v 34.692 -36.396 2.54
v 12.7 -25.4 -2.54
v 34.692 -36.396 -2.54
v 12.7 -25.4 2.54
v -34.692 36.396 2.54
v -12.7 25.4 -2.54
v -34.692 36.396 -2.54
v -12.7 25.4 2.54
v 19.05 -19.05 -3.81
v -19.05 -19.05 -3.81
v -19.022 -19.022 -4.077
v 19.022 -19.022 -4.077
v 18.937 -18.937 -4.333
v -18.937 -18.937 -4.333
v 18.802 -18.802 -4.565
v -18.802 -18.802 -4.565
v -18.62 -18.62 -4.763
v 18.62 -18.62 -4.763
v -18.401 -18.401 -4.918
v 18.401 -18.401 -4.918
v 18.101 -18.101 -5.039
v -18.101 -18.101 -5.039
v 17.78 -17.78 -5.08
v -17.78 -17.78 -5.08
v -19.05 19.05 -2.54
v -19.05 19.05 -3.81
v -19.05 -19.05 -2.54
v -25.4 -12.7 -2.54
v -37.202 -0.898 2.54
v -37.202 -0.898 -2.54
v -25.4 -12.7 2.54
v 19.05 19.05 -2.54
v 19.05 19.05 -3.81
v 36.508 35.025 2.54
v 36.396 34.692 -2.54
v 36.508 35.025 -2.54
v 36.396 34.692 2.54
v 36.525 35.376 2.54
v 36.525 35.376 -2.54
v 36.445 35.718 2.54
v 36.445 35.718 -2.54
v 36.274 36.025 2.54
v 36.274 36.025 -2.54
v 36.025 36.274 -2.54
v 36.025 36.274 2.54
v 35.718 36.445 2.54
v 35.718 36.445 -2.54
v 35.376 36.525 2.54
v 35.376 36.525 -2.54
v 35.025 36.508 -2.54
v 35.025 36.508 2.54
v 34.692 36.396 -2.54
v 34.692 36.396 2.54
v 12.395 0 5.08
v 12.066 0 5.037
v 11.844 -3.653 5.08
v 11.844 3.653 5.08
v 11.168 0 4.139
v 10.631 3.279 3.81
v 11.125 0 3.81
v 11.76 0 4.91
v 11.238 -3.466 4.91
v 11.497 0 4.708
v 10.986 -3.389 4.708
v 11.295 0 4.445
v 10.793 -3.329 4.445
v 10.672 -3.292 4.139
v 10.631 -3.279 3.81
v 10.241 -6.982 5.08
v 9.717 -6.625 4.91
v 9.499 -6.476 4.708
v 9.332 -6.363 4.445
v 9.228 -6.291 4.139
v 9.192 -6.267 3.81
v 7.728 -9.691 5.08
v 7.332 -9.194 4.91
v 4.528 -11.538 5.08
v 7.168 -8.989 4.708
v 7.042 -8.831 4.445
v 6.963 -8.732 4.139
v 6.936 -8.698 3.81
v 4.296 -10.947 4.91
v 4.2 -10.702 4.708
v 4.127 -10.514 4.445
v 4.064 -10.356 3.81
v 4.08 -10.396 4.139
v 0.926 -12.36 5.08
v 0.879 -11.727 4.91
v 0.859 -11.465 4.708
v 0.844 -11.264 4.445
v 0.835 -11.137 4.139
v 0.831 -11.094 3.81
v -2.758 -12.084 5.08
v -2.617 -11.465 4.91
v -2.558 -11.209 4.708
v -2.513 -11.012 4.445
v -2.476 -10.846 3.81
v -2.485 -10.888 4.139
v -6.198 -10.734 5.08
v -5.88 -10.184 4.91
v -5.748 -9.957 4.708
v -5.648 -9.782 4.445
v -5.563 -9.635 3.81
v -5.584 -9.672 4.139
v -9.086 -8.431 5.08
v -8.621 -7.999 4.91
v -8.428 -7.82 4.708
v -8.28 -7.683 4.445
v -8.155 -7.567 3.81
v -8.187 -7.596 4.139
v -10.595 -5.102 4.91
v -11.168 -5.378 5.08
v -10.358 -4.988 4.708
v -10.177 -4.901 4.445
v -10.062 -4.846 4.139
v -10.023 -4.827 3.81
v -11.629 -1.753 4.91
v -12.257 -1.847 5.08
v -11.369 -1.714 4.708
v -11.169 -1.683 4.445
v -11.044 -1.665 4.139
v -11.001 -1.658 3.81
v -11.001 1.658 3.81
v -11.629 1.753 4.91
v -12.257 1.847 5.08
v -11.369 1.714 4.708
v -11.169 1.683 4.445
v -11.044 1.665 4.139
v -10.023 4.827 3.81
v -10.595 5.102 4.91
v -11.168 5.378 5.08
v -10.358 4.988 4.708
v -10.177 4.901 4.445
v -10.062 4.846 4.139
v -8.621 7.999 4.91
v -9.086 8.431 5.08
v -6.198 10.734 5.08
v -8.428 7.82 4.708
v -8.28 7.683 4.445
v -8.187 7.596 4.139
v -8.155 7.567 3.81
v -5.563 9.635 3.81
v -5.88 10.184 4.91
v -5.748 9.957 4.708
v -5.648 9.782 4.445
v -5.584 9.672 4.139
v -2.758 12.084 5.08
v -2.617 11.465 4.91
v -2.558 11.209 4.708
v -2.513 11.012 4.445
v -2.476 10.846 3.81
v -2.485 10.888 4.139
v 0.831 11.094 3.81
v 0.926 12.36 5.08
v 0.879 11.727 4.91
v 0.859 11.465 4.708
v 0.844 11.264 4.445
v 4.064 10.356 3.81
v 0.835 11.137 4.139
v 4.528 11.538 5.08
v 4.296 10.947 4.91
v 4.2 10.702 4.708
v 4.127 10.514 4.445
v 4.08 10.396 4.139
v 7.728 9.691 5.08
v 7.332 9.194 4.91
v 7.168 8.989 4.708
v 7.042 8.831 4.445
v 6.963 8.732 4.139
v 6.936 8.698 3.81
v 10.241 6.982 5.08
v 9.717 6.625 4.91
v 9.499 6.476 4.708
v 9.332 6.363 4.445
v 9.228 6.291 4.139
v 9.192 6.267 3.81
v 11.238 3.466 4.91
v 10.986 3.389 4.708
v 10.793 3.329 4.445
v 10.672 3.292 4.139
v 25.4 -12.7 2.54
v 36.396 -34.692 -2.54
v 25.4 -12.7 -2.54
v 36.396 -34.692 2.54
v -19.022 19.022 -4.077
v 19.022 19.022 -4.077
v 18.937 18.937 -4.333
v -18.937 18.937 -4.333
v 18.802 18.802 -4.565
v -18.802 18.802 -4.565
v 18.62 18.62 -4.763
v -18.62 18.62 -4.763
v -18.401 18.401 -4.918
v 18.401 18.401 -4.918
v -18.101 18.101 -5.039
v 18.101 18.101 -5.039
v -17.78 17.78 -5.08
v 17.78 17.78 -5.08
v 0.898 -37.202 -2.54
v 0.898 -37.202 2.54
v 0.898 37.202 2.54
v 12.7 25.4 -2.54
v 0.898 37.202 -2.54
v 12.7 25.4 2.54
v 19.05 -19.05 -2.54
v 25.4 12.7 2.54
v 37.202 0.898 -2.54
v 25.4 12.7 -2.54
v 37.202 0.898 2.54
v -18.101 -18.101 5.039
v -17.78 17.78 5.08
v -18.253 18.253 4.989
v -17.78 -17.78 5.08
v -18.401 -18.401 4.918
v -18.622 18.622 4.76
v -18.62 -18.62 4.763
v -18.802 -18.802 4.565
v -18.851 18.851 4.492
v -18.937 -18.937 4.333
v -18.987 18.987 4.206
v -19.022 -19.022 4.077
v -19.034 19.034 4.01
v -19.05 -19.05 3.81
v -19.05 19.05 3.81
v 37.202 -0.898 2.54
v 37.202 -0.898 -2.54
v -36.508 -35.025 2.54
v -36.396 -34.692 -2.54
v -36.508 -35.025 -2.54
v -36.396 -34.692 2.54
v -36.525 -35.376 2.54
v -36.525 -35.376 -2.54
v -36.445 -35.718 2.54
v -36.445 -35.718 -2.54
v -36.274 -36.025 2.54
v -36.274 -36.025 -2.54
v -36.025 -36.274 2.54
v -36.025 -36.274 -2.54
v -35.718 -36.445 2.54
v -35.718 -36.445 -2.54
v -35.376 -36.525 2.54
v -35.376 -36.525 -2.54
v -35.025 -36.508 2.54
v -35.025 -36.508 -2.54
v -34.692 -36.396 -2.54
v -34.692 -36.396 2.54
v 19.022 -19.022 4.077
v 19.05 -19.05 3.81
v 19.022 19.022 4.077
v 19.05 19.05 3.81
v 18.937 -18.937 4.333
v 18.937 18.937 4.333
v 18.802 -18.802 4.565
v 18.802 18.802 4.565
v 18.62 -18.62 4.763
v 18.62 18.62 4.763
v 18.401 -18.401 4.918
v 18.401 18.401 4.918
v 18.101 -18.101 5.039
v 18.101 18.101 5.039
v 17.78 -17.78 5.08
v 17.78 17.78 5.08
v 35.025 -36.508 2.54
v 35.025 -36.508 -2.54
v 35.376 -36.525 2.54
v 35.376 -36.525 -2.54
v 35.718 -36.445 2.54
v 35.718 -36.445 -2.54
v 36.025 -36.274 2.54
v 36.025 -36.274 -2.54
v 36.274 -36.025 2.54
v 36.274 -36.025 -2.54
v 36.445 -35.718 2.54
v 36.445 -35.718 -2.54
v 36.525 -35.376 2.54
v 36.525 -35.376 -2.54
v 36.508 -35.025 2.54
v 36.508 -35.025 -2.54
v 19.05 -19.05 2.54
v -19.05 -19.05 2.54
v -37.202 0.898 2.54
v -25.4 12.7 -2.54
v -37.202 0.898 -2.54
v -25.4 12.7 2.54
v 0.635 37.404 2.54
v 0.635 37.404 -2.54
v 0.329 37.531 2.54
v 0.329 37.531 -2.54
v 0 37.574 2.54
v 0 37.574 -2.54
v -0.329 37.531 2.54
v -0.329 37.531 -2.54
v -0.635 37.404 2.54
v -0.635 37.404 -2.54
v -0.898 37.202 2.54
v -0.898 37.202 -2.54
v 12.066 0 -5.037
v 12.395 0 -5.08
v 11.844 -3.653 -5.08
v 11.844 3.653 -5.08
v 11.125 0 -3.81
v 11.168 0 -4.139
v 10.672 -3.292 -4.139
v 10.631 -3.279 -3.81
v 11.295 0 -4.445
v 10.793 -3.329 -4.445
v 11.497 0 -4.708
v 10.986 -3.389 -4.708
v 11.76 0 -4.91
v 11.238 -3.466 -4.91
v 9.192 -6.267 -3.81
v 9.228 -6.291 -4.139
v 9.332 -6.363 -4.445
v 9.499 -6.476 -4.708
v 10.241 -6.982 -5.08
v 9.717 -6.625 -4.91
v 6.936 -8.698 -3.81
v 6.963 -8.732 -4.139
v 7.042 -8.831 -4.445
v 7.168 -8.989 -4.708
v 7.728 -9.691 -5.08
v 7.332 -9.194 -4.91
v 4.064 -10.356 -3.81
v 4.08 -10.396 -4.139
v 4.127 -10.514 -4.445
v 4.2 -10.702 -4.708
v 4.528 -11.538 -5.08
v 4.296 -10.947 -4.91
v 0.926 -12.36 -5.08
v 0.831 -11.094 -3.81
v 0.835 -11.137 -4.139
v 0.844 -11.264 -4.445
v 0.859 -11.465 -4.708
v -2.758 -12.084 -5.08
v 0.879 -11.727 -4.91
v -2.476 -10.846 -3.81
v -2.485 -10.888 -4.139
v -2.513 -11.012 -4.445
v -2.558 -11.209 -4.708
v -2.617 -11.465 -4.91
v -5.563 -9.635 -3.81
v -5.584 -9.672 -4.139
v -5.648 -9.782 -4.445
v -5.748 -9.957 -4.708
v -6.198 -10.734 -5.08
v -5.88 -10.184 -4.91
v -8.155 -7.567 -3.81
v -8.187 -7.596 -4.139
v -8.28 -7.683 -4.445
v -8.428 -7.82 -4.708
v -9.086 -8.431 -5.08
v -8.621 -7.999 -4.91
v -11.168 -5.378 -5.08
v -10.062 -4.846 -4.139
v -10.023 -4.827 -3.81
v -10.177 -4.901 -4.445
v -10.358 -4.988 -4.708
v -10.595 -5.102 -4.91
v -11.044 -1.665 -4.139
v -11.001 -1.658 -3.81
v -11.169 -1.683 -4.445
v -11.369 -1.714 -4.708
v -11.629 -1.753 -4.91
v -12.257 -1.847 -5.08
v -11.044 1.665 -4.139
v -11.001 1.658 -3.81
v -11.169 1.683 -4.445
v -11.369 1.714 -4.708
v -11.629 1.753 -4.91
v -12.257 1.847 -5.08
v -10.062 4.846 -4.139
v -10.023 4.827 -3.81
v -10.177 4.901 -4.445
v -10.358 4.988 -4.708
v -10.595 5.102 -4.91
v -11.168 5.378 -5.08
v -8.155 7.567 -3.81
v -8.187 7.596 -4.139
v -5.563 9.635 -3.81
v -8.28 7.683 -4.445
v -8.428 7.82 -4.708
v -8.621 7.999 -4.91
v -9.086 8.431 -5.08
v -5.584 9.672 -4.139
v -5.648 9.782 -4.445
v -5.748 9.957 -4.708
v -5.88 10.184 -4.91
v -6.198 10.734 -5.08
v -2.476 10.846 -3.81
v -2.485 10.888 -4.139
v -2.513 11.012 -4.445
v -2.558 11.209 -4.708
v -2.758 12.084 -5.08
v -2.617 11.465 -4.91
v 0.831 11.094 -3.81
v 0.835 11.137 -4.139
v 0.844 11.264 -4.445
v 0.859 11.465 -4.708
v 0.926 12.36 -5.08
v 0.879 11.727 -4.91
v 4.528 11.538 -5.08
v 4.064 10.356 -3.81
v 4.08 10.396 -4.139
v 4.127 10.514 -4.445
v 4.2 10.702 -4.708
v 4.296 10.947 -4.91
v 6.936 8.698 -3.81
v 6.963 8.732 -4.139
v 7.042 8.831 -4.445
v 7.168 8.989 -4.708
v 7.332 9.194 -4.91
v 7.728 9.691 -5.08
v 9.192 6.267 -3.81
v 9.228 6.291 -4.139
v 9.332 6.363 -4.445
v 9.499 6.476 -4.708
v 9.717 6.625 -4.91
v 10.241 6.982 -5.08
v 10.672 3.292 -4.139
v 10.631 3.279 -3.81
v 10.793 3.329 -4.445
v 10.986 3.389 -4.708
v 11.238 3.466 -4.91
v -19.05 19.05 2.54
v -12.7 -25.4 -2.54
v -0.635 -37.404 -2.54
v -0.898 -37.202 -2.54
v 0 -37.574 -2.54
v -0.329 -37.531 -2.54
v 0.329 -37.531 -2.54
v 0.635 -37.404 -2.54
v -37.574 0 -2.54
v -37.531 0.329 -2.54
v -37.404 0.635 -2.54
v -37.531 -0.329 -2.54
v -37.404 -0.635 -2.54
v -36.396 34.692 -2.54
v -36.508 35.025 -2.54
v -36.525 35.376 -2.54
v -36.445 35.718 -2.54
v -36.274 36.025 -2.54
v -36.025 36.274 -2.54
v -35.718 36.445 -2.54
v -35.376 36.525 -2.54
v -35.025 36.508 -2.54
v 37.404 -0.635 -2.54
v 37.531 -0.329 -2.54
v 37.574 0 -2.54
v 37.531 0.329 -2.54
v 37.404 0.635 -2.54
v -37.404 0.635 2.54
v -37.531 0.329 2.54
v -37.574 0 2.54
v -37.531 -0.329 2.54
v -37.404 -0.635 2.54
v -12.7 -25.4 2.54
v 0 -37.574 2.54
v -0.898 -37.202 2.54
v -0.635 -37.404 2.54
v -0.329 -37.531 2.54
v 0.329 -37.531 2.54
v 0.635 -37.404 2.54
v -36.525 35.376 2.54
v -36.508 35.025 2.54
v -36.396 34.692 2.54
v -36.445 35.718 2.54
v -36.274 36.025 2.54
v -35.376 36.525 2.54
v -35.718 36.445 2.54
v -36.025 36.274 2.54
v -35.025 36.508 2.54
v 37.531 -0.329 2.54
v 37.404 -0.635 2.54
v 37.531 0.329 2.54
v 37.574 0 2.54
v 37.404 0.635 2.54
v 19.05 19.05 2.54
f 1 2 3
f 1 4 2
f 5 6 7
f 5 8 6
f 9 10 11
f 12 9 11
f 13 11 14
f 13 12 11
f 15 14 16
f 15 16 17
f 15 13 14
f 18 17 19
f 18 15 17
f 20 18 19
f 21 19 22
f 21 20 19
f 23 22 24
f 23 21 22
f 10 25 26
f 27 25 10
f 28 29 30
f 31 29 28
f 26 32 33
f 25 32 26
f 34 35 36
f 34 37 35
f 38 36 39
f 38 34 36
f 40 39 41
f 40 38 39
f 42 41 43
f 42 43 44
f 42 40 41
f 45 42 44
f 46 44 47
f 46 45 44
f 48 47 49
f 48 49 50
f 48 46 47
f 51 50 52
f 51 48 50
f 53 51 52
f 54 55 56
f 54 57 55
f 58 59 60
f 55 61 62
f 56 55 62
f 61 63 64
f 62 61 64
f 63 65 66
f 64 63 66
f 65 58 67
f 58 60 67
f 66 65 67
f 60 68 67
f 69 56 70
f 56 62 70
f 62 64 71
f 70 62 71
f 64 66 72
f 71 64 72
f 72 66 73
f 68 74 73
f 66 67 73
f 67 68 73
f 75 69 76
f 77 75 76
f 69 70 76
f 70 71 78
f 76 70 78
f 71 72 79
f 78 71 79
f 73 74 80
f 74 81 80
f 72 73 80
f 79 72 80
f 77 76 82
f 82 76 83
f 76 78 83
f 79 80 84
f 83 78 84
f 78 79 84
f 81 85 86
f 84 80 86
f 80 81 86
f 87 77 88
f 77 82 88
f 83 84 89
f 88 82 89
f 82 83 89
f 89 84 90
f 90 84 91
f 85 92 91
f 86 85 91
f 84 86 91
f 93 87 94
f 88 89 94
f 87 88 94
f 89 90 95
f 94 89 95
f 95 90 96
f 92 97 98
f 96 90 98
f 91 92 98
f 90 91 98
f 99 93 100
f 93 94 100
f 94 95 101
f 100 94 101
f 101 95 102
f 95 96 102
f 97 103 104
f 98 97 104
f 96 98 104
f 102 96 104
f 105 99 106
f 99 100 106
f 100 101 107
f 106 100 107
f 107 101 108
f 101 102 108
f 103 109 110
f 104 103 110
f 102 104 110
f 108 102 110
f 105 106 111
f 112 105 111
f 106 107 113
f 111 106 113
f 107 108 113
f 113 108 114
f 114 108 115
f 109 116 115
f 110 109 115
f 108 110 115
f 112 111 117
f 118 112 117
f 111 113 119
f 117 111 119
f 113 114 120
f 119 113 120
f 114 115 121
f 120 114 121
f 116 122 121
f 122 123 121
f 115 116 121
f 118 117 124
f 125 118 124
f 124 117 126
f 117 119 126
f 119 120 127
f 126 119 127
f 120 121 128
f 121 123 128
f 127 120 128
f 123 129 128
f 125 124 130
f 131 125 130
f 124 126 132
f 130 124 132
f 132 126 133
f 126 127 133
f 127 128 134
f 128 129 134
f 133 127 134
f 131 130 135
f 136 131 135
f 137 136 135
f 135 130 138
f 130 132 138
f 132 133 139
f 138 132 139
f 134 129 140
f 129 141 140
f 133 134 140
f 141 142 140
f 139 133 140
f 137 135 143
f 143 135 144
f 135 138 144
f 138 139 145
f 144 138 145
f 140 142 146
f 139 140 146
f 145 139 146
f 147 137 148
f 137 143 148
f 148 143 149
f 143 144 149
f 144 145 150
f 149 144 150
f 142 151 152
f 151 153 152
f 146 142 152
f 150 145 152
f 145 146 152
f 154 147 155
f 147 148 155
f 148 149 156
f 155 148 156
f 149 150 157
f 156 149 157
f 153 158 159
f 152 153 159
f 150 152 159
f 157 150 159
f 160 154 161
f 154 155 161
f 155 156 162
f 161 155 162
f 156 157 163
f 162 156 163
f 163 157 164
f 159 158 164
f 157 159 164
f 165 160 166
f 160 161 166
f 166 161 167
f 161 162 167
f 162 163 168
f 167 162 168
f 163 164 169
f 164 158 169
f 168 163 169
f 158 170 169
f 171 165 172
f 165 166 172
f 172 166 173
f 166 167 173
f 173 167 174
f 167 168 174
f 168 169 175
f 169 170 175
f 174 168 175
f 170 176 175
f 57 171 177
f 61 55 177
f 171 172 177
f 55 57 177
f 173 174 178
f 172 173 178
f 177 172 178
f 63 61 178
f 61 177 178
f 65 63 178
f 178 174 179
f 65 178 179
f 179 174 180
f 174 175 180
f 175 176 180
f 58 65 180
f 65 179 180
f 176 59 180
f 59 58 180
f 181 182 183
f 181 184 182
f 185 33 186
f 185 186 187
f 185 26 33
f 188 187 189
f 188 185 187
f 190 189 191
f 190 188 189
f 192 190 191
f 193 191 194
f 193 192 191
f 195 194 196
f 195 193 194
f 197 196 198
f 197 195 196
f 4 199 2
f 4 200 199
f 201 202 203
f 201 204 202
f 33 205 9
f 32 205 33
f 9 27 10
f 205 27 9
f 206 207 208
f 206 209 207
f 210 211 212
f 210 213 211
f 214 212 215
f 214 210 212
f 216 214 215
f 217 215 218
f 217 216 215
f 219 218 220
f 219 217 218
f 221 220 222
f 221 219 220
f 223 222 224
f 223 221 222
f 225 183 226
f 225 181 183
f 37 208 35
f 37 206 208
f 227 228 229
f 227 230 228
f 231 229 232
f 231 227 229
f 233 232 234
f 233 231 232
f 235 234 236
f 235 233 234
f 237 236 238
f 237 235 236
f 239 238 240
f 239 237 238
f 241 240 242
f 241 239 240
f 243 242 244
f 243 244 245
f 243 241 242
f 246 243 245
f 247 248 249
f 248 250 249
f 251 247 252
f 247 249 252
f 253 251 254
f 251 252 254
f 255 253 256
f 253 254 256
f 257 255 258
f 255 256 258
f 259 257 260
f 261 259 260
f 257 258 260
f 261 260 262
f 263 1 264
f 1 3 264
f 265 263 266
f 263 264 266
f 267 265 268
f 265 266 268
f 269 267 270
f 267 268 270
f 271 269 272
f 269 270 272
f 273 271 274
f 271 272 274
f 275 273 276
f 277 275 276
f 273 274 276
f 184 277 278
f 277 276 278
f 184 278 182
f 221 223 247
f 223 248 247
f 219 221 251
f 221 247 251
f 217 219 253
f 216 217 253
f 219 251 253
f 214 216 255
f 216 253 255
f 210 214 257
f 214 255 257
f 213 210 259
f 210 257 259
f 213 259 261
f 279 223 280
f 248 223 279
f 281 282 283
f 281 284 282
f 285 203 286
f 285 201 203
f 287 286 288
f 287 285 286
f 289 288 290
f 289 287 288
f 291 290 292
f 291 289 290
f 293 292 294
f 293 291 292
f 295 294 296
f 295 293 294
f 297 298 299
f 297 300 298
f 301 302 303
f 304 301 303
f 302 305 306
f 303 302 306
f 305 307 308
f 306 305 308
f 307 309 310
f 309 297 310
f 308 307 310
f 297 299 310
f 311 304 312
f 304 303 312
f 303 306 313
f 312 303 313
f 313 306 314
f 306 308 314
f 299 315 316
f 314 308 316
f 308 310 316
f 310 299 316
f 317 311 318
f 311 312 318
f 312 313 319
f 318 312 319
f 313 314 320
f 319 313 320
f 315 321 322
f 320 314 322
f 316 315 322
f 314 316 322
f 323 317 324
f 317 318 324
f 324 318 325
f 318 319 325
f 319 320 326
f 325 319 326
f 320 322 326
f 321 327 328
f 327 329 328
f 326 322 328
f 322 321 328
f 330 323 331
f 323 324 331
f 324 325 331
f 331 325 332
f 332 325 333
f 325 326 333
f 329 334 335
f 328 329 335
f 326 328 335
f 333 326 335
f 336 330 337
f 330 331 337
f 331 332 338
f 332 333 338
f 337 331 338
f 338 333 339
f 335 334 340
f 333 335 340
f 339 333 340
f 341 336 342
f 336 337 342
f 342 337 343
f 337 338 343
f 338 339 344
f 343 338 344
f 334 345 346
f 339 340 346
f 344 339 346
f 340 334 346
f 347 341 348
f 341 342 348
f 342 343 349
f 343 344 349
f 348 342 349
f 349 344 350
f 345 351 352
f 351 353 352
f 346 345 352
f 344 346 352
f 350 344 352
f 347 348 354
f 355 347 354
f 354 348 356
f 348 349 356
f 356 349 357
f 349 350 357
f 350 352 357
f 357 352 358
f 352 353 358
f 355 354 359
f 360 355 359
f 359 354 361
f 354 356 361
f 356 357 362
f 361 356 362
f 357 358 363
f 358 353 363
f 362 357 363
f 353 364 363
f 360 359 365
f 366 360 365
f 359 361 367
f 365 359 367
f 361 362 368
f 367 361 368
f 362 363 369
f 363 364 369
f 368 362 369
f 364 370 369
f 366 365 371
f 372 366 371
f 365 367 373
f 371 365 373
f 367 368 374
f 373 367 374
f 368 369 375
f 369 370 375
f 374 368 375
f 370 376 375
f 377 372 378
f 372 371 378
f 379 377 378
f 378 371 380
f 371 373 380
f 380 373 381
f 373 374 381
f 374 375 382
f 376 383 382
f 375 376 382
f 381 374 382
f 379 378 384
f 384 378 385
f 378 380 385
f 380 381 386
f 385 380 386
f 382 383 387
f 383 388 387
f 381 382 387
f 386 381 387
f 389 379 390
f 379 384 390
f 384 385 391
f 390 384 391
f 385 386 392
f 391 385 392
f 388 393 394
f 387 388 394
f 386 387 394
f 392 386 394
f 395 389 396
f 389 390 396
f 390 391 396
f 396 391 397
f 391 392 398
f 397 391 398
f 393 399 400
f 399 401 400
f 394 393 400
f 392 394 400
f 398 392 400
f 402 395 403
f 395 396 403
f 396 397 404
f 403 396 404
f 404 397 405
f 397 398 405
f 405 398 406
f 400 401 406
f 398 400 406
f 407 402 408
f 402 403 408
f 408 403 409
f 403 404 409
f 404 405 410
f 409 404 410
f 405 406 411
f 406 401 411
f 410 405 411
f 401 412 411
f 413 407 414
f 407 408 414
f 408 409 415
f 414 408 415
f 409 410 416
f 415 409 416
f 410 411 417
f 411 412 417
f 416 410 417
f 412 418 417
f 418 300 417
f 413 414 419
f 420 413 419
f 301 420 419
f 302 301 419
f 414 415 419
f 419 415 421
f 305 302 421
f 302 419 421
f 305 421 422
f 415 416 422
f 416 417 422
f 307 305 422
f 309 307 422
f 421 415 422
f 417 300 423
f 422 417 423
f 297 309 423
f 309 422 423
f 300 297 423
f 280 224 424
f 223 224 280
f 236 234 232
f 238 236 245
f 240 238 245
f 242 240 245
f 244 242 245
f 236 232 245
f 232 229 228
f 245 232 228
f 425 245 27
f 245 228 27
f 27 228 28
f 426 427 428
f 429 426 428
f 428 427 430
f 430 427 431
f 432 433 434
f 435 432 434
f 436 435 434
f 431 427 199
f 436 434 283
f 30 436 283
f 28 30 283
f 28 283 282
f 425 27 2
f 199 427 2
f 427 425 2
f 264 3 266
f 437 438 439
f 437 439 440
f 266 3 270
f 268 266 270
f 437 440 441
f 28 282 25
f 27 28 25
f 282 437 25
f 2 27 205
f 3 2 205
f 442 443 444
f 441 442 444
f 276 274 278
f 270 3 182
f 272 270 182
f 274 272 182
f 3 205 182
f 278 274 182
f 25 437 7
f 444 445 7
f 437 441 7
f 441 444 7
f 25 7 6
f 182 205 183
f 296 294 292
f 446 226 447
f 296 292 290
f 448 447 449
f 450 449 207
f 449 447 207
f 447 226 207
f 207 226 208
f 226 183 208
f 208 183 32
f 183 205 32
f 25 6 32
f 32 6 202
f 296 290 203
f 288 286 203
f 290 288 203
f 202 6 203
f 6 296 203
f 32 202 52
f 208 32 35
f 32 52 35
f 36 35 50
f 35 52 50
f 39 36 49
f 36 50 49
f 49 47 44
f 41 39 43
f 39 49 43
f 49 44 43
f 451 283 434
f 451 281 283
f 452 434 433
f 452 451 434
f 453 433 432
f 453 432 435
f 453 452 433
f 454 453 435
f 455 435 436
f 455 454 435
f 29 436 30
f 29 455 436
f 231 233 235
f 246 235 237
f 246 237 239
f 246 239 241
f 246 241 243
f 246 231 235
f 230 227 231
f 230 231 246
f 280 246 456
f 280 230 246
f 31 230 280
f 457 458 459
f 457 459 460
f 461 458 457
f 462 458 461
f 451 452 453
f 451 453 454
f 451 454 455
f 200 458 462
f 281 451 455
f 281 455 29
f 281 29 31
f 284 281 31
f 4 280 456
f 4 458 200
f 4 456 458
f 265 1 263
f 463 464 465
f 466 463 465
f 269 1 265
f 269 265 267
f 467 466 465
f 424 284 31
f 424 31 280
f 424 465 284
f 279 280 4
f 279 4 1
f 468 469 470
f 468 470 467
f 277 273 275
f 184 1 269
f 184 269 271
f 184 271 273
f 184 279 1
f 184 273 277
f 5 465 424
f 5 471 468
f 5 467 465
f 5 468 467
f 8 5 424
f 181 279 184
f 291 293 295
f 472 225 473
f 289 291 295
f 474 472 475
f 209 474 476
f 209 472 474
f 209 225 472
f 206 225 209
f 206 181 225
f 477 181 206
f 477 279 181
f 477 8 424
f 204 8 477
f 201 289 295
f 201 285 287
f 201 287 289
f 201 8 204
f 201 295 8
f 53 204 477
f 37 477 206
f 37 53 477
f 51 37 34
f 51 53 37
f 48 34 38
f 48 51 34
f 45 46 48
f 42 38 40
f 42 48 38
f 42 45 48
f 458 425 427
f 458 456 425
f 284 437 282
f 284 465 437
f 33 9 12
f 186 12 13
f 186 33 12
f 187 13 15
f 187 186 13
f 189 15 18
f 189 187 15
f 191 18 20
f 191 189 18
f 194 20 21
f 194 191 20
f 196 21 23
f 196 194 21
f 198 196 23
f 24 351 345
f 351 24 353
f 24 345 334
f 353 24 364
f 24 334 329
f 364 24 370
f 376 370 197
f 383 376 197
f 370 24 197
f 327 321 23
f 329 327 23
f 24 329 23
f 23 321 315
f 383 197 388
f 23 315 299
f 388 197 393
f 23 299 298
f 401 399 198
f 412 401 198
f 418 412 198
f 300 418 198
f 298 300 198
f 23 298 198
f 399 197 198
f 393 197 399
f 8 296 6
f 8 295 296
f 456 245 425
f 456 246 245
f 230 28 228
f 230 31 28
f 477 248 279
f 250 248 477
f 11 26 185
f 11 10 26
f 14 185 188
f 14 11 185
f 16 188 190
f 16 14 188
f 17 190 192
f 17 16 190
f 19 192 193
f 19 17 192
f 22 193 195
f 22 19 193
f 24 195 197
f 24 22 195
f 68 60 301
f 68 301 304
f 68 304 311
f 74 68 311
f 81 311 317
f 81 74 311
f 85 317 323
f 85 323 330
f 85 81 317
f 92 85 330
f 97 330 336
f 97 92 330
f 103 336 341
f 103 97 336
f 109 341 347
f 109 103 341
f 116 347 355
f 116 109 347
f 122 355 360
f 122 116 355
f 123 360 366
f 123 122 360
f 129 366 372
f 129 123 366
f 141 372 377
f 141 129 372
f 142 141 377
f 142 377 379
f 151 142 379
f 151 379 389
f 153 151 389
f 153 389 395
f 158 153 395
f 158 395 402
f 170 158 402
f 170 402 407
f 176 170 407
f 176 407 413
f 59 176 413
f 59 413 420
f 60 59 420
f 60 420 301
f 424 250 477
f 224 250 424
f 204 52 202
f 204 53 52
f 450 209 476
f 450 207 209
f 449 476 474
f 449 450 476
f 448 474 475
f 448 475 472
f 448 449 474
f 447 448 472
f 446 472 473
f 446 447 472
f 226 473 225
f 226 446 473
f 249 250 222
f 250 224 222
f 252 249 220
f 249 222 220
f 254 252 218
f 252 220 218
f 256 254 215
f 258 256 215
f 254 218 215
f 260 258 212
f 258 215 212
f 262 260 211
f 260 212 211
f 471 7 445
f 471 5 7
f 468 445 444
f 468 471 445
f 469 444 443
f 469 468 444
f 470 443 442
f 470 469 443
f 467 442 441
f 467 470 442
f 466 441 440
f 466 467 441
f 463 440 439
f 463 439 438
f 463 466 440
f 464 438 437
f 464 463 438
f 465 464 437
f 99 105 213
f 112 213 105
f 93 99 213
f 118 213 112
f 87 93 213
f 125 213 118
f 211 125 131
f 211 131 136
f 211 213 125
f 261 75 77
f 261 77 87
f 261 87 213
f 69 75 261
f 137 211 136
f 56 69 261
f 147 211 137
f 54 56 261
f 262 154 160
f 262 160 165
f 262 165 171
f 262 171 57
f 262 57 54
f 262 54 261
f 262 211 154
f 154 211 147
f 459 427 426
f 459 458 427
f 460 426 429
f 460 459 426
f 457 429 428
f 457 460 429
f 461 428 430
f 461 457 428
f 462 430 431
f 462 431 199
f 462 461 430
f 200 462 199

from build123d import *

# Parameters (mm, degrees)
F1_DEPTH = 5.08
F2_R     = 1.27
F3_DEPTH = 2.54
F4_R     = 1.27


with BuildPart() as f1:
    # F0 (on Top) → F1 (new body, symmetric)
    with BuildSketch(Plane.XY):
        with BuildLine():
            Line((19.05, 19.05), (-19.05, 19.05))
            Line((-19.05, 19.05), (-19.05, 0))
            Line((-19.05, 0), (-11.125, 0))
            ThreePointArc((-11.125, 0), (0, 11.125), (11.125, 0))
            Line((11.125, 0), (19.05, 0))
            Line((19.05, 0), (19.05, 19.05))
        make_face()
        with BuildLine():
            Line((-11.125, 0), (-19.05, 0))
            Line((-19.05, 0), (-19.05, -19.05))
            Line((-19.05, -19.05), (19.05, -19.05))
            Line((19.05, -19.05), (19.05, 0))
            Line((19.05, 0), (11.125, 0))
            ThreePointArc((11.125, 0), (0, -11.125), (-11.125, 0))
        make_face()
    extrude(amount=F1_DEPTH, both=True)

    # F2
    f2_edges = [f1.edges().sort_by_distance(p)[0] for p in [
        (19.05, 0, 5.08),
        (0, -19.05, 5.08),
        (-19.05, 0, 5.08),
        (0, 19.05, 5.08),
        (-11.125, 0, 5.08),
        (-11.125, 0, -5.08),
        (19.05, 0, -5.08),
        (0, -19.05, -5.08),
        (0, 19.05, -5.08),
        (-19.05, 0, -5.08),
    ]]
    fillet(f2_edges, radius=F2_R)

    # F0 (on Top) → F3 (join, symmetric)
    with BuildSketch(Plane.XY):
        Polygon((-12.7, -25.4), (-19.05, -19.05), (-25.4, -12.7), (-38.1, -38.1), align=None)
        Polygon((19.05, -19.05), (-19.05, -19.05), (-12.7, -25.4), (0, -38.1), (12.7, -25.4), align=None)
        Polygon((25.4, -12.7), (19.05, -19.05), (12.7, -25.4), (38.1, -38.1), align=None)
        Polygon((38.1, 0), (19.05, 0), (19.05, -19.05), (25.4, -12.7), align=None)
        Polygon((25.4, 12.7), (19.05, 19.05), (19.05, 0), (38.1, 0), align=None)
        Polygon((-12.7, 25.4), (-19.05, 19.05), (19.05, 19.05), (12.7, 25.4), (0, 38.1), align=None)
        Polygon((-19.05, 0), (-19.05, 19.05), (-25.4, 12.7), (-38.1, 0), (-25.4, -12.7), (-19.05, -19.05), align=None)
        Polygon((-25.4, 12.7), (-19.05, 19.05), (-12.7, 25.4), (-38.1, 38.1), align=None)
        Polygon((12.7, 25.4), (19.05, 19.05), (25.4, 12.7), (38.1, 38.1), align=None)
    extrude(amount=F3_DEPTH, both=True)

    # F4
    f4_edges = [f1.edges().sort_by_distance(p)[0] for p in [
        (-38.1, -38.1, 0),
        (-38.1, 0, 0),
        (-38.1, 38.1, 0),
        (0, 38.1, 0),
        (38.1, 38.1, 0),
        (38.1, 0, 0),
        (38.1, -38.1, 0),
        (0, -38.1, 0),
    ]]
    fillet(f4_edges, radius=F4_R)


solid = f1.part
